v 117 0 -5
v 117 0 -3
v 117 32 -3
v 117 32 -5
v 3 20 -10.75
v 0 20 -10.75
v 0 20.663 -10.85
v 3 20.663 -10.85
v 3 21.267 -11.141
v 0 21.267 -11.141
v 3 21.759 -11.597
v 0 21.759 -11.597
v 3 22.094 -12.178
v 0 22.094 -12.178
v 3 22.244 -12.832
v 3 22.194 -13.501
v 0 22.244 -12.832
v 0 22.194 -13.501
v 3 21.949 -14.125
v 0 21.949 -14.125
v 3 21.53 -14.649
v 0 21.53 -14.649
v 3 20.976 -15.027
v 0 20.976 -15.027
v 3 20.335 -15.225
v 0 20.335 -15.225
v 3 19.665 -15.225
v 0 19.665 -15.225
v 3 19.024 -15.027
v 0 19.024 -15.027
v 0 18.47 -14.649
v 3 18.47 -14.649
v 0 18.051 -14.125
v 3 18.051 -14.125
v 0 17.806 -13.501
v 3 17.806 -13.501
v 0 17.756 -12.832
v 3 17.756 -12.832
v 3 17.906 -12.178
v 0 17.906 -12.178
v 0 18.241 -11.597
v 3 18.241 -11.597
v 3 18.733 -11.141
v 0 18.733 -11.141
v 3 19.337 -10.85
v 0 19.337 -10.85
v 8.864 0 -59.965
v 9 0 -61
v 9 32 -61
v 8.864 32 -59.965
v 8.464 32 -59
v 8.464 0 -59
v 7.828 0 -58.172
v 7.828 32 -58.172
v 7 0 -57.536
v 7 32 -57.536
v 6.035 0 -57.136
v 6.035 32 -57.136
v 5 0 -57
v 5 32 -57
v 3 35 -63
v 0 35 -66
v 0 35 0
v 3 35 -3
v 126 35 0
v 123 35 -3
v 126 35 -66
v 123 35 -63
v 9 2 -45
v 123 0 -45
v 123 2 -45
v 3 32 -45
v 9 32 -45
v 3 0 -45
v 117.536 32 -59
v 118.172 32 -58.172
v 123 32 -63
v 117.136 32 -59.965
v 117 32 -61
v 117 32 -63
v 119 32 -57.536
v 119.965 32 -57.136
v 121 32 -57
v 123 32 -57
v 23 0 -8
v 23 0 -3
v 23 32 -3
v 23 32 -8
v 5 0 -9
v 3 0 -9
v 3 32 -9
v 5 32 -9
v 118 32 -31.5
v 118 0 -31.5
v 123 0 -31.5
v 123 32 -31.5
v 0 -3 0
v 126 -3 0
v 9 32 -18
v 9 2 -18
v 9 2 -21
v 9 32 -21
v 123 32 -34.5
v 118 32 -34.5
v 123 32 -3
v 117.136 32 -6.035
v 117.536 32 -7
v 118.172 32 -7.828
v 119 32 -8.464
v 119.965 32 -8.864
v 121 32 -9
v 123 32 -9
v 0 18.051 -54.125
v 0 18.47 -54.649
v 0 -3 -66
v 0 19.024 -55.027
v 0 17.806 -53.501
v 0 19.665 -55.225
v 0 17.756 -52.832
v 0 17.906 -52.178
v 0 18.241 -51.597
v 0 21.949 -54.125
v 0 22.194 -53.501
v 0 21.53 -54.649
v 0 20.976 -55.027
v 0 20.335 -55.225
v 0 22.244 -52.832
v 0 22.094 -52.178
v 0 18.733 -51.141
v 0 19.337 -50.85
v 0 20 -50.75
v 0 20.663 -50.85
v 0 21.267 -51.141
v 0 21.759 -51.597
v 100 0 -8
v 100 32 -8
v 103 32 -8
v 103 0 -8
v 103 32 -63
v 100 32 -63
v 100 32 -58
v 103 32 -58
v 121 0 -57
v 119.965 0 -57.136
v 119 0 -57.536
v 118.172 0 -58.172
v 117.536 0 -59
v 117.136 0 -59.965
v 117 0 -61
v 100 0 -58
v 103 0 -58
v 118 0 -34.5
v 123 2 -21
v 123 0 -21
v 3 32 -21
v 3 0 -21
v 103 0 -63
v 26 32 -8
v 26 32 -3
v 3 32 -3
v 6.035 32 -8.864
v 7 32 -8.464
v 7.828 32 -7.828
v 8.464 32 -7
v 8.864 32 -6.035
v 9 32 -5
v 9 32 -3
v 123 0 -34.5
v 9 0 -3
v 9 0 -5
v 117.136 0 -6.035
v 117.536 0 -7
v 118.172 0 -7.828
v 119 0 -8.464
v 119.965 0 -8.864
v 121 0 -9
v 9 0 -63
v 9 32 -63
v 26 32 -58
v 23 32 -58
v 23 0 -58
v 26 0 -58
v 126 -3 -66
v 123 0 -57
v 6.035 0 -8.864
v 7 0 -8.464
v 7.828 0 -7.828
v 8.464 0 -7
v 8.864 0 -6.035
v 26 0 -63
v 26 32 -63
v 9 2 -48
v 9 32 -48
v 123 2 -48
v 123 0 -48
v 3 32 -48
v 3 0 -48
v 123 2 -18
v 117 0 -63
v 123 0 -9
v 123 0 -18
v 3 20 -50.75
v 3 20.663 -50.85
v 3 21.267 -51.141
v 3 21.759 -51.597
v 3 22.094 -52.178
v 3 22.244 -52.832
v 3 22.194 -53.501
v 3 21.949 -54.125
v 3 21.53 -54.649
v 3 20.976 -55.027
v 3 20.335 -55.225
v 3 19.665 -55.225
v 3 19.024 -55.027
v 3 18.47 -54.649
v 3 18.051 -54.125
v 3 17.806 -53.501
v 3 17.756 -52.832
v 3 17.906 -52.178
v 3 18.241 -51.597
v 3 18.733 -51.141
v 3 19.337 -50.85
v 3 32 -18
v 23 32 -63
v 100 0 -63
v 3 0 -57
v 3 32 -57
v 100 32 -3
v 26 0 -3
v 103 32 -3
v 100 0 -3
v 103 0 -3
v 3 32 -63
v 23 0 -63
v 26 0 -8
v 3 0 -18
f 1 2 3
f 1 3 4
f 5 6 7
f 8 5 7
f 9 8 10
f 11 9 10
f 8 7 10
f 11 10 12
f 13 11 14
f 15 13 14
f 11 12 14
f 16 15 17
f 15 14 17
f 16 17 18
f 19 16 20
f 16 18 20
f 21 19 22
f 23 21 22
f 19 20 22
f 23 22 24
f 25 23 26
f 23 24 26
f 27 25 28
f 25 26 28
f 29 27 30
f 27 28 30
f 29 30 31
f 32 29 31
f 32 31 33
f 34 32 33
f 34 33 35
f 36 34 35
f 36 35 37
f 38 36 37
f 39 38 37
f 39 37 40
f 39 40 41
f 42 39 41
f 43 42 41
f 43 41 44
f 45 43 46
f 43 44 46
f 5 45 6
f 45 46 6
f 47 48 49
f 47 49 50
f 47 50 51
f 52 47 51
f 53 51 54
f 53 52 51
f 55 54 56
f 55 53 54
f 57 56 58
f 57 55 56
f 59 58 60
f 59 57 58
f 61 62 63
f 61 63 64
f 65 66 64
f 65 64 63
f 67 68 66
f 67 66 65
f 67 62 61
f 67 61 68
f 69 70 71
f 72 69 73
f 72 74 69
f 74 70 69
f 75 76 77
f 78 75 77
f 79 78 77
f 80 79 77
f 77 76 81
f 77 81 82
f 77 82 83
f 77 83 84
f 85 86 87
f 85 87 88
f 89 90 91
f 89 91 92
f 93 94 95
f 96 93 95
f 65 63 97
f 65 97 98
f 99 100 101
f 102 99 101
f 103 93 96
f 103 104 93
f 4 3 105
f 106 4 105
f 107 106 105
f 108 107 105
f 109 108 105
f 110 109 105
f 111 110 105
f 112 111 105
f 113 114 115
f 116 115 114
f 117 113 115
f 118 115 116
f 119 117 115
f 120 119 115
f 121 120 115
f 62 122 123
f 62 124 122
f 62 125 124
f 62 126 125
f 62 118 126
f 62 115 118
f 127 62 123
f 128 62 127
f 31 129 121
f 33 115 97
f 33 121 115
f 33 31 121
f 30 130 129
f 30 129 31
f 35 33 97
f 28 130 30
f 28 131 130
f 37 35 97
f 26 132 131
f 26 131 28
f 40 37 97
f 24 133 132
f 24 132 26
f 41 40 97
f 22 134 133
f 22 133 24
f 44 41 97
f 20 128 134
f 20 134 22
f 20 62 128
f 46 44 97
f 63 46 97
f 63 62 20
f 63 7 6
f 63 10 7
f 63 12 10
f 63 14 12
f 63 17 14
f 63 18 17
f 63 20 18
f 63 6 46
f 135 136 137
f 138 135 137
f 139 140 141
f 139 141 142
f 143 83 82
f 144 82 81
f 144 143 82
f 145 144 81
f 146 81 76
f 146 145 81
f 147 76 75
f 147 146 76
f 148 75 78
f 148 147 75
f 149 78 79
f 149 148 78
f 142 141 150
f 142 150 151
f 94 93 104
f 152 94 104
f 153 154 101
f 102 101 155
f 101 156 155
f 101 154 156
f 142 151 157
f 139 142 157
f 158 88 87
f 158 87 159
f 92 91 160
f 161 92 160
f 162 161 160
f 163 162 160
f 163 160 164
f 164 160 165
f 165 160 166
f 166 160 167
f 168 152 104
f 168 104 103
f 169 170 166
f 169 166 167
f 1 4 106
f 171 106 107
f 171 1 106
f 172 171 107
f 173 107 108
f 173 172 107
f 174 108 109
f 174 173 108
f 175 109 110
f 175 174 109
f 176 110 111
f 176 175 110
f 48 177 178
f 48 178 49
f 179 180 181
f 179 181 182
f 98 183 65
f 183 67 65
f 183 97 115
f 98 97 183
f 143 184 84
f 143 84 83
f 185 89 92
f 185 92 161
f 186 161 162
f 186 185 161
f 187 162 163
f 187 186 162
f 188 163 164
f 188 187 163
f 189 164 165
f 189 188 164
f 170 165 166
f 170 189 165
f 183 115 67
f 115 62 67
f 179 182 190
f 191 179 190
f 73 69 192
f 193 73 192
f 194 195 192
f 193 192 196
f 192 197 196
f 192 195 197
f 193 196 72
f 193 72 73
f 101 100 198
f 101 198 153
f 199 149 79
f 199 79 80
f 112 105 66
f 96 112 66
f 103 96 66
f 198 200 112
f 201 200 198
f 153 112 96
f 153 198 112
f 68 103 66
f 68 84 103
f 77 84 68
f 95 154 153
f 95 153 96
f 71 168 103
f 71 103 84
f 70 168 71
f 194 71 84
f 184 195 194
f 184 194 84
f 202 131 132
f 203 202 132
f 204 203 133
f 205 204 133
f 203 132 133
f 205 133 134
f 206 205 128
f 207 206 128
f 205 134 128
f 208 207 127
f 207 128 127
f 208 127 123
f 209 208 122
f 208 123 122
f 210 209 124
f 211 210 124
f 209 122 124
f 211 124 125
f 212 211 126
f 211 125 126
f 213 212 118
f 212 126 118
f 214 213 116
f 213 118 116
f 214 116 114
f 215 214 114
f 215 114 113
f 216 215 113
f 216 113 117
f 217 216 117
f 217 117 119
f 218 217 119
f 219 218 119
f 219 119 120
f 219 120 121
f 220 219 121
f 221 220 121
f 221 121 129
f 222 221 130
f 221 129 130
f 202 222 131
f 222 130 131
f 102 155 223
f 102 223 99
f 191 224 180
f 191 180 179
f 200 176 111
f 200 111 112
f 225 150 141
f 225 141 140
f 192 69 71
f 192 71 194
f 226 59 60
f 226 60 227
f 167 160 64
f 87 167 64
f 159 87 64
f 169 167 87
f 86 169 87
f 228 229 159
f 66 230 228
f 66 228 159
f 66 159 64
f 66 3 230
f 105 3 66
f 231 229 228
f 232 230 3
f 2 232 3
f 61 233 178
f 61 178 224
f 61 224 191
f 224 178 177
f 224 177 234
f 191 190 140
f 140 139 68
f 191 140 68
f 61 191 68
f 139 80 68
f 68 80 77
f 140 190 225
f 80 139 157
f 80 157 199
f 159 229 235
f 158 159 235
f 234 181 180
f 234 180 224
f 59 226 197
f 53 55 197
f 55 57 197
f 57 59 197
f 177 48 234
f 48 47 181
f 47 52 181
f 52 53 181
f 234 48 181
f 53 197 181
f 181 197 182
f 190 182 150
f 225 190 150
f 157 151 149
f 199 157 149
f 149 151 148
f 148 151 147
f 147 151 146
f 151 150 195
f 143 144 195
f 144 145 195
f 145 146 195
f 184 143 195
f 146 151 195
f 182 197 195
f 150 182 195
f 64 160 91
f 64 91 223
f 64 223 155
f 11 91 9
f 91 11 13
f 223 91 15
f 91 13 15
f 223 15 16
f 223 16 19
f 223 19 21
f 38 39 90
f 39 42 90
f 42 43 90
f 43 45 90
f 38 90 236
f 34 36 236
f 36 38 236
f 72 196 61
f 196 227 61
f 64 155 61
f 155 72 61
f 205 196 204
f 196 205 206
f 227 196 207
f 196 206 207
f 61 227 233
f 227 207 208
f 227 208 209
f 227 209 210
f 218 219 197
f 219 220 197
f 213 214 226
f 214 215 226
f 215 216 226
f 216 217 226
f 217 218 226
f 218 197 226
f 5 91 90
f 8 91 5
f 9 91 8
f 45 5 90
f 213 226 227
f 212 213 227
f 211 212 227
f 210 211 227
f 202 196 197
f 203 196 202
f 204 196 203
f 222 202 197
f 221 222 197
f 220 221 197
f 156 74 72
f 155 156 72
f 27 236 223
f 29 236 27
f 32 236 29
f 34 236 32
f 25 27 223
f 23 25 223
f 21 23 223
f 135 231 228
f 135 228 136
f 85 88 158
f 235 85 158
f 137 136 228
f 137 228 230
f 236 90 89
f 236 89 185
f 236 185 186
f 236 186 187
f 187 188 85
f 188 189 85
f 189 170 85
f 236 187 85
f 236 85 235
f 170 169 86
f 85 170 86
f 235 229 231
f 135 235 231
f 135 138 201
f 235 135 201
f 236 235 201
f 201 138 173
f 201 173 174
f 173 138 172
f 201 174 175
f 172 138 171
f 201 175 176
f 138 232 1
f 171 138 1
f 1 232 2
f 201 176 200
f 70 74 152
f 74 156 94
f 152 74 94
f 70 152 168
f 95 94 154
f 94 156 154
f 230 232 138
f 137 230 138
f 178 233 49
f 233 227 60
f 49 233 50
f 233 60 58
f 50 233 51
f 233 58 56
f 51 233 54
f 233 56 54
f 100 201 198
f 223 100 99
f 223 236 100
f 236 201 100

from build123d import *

# Parameters (mm, degrees)
SKETCH_3_W          = 126
SKETCH_3_H          = 66
SKETCH_3_W_2        = 120
SKETCH_3_H_2        = 60
EXTRUDE_2_DEPTH     = 35
SKETCH_4_W          = 6
SKETCH_4_H          = 3
SKETCH_4_W_2        = 5
SKETCH_4_W_3        = 3
SKETCH_4_H_2        = 5
EXTRUDE_3_DEPTH     = 35
SKETCH_5_W          = 120
SKETCH_5_H          = 60
CUT_EXTRUDE_1_DEPTH = 3
EXTRUDE_4_DEPTH     = 32
SKETCH_7_W          = 126
SKETCH_7_H          = 66
EXTRUDE_5_DEPTH     = 3
SKETCH_8_W          = 3
SKETCH_8_H          = 2
EXTRUDE_6_DEPTH     = 114
SKETCH_10_R         = 2.25
CUT_EXTRUDE_2_DEPTH = 3


with BuildPart() as part:
    # Эскиз3 → Бобышка-Вытянуть2 (new body)
    with BuildSketch(Plane(origin=(0, 0, 0), x_dir=(1, 0, 0), z_dir=(0, 1, 0))):
        with Locations((63, 33)):
            Rectangle(SKETCH_3_W, SKETCH_3_H)
        with Locations((63, 33)):
            Rectangle(SKETCH_3_W_2, SKETCH_3_H_2, mode=Mode.SUBTRACT)
    extrude(amount=EXTRUDE_2_DEPTH)

    # Эскиз4 → Бобышка-Вытянуть3 (add)
    with BuildSketch(Plane(origin=(0, 35, 0), x_dir=(1, 0, 0), z_dir=(0, 1, 0))):
        with Locations((6, 19.5)):
            Rectangle(SKETCH_4_W, SKETCH_4_H)
        with Locations((6, 46.5)):
            Rectangle(SKETCH_4_W, SKETCH_4_H)
        with Locations((120.5, 33)):
            Rectangle(SKETCH_4_W_2, SKETCH_4_H)
        with Locations((24.5, 60.5)):
            Rectangle(SKETCH_4_W_3, SKETCH_4_H_2)
        with Locations((101.5, 60.5)):
            Rectangle(SKETCH_4_W_3, SKETCH_4_H_2)
        with Locations((101.5, 5.5)):
            Rectangle(SKETCH_4_W_3, SKETCH_4_H_2)
        with Locations((24.5, 5.5)):
            Rectangle(SKETCH_4_W_3, SKETCH_4_H_2)
    extrude(amount=-EXTRUDE_3_DEPTH)

    # Эскиз5 → Вырез-Вытянуть1 (cut)
    with BuildSketch(Plane(origin=(0, 35, 0), x_dir=(1, 0, 0), z_dir=(0, 1, 0))):
        with Locations((63, 33)):
            Rectangle(SKETCH_5_W, SKETCH_5_H)
    extrude(amount=-CUT_EXTRUDE_1_DEPTH, mode=Mode.SUBTRACT)

    # Эскиз6 → Бобышка-Вытянуть4 (add)
    with BuildSketch(Plane.XZ):
        with BuildLine():
            Line((3, -63), (9, -63))
            Line((9, -63), (9, -61))
            ThreePointArc((9, -61), (7.828427125, -58.171572875), (5, -57))
            Line((5, -57), (3, -57))
            Line((3, -57), (3, -63))
        make_face()
        with BuildLine():
            Line((3, -9), (5, -9))
            ThreePointArc((5, -9), (7.828427125, -7.828427125), (9, -5))
            Line((9, -5), (9, -3))
            Line((9, -3), (3, -3))
            Line((3, -3), (3, -9))
        make_face()
        with BuildLine():
            Line((123, -3), (117, -3))
            Line((117, -3), (117, -5))
            ThreePointArc((117, -5), (118.171572875, -7.828427125), (121, -9))
            Line((121, -9), (123, -9))
            Line((123, -9), (123, -3))
        make_face()
        with BuildLine():
            Line((123, -57), (121, -57))
            ThreePointArc((121, -57), (118.171572875, -58.171572875), (117, -61))
            Line((117, -61), (117, -63))
            Line((117, -63), (123, -63))
            Line((123, -63), (123, -57))
        make_face()
    extrude(amount=-EXTRUDE_4_DEPTH)

    # Эскиз7 → Бобышка-Вытянуть5 (add)
    with BuildSketch(Plane.XZ):
        with Locations((63, -33)):
            Rectangle(SKETCH_7_W, SKETCH_7_H)
    extrude(amount=EXTRUDE_5_DEPTH)

    # Эскиз8 → Бобышка-Вытянуть6 (add)
    with BuildSketch(Plane(origin=(9, 0, 0), x_dir=(0, 0, -1), z_dir=(1, 0, 0))):
        with Locations((19.5, 1)):
            Rectangle(SKETCH_8_W, SKETCH_8_H)
        with Locations((46.5, 1)):
            Rectangle(SKETCH_8_W, SKETCH_8_H)
    extrude(amount=EXTRUDE_6_DEPTH)

    # Эскиз10 → Вырез-Вытянуть2 (cut)
    with BuildSketch(Plane.ZY):
        with Locations((-53, 20)):
            Circle(SKETCH_10_R)
        with Locations((-13, 20)):
            Circle(SKETCH_10_R)
    extrude(amount=-CUT_EXTRUDE_2_DEPTH, mode=Mode.SUBTRACT)


solid = part.part
